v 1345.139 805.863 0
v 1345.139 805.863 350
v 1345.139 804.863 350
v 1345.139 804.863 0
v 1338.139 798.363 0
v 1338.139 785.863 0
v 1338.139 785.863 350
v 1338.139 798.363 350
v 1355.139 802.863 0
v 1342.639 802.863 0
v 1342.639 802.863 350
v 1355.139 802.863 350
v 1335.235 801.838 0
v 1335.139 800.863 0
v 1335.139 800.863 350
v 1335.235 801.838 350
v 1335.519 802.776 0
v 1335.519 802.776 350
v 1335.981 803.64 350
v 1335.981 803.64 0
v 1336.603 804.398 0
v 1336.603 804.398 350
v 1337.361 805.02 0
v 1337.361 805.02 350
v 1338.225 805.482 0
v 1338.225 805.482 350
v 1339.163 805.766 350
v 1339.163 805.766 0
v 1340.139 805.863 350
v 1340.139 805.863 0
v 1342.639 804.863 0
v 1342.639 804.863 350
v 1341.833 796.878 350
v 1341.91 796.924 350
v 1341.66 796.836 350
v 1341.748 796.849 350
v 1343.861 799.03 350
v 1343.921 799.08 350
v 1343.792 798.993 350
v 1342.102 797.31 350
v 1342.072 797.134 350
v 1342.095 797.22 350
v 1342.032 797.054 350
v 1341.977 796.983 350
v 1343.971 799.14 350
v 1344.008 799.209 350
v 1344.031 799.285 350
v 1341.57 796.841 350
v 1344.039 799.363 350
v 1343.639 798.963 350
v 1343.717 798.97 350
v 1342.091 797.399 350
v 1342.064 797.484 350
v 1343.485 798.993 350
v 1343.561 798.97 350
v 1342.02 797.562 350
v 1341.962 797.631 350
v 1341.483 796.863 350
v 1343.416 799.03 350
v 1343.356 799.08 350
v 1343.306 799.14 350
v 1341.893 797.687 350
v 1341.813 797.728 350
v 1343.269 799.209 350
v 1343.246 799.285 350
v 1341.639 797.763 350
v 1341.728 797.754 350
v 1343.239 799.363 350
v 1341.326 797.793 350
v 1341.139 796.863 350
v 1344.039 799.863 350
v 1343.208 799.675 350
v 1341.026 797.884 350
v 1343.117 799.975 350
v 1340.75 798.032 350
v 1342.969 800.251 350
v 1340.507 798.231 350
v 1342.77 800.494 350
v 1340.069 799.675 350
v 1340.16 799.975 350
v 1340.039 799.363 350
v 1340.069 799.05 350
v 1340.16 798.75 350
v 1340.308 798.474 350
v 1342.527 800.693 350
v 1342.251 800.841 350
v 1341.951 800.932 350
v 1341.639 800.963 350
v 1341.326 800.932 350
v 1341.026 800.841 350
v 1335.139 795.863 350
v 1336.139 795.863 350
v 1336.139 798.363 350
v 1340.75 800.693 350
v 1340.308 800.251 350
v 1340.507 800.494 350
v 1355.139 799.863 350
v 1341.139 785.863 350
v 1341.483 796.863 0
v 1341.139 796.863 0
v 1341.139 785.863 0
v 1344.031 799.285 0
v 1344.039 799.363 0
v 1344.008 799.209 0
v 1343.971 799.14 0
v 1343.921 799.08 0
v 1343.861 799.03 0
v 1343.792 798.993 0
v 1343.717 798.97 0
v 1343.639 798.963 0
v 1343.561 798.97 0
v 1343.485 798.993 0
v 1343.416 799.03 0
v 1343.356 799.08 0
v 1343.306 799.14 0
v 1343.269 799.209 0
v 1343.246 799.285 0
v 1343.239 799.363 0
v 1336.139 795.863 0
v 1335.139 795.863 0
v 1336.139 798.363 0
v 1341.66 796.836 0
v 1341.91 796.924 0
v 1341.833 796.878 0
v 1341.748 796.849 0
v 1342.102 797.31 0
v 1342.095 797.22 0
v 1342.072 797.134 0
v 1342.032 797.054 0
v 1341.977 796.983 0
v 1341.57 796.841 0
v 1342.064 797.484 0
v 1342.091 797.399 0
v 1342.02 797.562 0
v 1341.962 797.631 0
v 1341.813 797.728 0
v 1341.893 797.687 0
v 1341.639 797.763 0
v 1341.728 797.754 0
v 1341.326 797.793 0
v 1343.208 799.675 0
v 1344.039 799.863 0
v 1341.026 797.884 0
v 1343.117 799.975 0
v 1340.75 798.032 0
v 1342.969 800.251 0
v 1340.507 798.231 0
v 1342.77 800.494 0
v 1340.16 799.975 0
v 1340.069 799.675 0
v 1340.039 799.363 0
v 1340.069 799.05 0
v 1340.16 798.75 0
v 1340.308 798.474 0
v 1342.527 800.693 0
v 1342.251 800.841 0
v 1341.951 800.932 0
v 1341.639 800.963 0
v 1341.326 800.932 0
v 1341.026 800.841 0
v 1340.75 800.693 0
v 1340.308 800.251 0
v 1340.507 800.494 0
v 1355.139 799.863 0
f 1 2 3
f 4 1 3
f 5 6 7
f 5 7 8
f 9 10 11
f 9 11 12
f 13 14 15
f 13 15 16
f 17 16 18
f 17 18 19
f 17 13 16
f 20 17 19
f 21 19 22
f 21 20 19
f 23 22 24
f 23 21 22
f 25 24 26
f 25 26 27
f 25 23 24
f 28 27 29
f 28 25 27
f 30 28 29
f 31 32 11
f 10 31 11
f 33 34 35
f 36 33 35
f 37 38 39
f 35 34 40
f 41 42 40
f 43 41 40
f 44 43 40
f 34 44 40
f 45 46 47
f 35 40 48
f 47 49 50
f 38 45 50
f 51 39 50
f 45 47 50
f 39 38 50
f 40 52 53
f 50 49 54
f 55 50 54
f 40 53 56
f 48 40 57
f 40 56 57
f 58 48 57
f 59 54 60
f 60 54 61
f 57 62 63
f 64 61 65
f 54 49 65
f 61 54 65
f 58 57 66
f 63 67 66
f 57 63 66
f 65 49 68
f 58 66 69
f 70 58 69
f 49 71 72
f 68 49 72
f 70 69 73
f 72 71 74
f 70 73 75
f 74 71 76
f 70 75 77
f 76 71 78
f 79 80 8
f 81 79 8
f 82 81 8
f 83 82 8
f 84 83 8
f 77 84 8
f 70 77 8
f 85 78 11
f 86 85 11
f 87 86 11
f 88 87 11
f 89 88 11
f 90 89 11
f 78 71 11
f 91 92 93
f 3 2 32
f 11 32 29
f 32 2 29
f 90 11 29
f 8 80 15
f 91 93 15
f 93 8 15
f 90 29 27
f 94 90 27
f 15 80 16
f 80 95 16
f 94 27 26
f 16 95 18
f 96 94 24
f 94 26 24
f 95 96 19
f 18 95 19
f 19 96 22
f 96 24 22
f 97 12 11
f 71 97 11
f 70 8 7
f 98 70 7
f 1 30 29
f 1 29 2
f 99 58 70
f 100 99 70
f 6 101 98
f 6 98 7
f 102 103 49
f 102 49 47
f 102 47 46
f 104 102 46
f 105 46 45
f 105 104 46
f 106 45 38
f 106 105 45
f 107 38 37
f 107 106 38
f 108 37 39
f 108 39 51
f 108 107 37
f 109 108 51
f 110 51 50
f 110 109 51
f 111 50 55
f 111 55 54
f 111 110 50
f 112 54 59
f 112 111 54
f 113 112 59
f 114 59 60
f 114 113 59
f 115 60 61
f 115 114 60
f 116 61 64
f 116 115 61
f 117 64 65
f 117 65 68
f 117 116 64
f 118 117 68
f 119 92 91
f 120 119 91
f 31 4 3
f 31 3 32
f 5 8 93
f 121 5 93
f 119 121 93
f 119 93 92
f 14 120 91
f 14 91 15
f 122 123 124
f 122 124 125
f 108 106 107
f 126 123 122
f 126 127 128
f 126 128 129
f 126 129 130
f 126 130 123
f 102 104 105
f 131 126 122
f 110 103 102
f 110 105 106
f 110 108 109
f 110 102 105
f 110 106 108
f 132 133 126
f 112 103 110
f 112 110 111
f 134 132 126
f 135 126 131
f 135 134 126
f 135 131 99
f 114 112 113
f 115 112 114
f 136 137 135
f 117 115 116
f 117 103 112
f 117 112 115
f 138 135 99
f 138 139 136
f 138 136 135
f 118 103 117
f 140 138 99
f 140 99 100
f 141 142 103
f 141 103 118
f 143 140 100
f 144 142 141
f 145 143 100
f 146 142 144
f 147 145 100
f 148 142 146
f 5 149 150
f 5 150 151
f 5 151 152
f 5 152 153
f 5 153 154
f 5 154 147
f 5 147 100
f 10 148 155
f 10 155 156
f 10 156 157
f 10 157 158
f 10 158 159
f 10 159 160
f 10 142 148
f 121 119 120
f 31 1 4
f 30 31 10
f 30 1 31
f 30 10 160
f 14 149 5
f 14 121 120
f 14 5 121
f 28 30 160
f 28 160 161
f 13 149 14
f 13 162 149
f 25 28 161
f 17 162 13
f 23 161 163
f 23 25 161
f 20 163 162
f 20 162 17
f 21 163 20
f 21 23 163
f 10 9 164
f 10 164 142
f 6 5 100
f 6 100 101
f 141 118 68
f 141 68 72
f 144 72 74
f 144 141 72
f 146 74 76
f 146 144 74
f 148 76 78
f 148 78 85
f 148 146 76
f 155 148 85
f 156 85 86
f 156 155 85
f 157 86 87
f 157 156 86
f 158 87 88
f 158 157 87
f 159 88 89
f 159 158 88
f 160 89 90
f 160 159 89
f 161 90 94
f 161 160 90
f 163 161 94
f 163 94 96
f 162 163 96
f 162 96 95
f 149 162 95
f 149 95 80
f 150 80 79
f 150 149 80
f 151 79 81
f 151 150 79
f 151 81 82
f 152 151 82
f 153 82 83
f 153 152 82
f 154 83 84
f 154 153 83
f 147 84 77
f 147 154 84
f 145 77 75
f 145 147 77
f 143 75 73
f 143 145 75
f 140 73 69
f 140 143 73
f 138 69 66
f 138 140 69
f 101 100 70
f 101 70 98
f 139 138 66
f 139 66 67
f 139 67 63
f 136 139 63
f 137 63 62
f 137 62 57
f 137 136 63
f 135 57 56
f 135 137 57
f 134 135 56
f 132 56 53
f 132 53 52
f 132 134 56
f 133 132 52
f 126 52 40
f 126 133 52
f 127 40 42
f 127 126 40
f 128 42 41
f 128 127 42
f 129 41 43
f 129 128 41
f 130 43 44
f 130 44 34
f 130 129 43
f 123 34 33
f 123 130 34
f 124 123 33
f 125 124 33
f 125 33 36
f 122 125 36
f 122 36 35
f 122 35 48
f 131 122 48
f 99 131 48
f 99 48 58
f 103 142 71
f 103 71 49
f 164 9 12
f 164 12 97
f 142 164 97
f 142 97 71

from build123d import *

# Parameters (mm, degrees)
EXTRUDE_1_DEPTH = 350


with BuildPart() as part:
    # Model → 凸台-拉伸1 (new body)
    with BuildSketch(Plane.XY):
        with BuildLine():
            Line((1340.138554246, 805.862554257), (1345.138554246, 805.862554257))
            Line((1345.138554246, 805.862554257), (1345.138554246, 804.862554257))
            Line((1345.138554246, 804.862554257), (1342.638554246, 804.862554257))
            Line((1342.638554246, 804.862554257), (1342.638554246, 802.862554257))
            Line((1342.638554246, 802.862554257), (1355.138554246, 802.862554257))
            Line((1355.138554246, 802.862554257), (1355.138554246, 799.862554257))
            Line((1355.138554246, 799.862554257), (1344.038554246, 799.862554257))
            Line((1344.038554246, 799.862554257), (1344.038554246, 799.362554257))
            ThreePointArc((1344.038554246, 799.362554257), (1343.638554246, 798.962554257), (1343.238554246, 799.362554257))
            ThreePointArc((1343.238554246, 799.362554257), (1340.507183396, 800.493925107), (1341.638554246, 797.762554257))
            ThreePointArc((1341.638554246, 797.762554257), (1342.09519806, 797.220410998), (1341.483330886, 796.862554257))
            Line((1341.483330886, 796.862554257), (1341.138554246, 796.862554257))
            Line((1341.138554246, 796.862554257), (1341.138554246, 785.862554257))
            Line((1341.138554246, 785.862554257), (1338.138554246, 785.862554257))
            Line((1338.138554246, 785.862554257), (1338.138554246, 798.362554257))
            Line((1338.138554246, 798.362554257), (1336.138554246, 798.362554257))
            Line((1336.138554246, 798.362554257), (1336.138554246, 795.862554257))
            Line((1336.138554246, 795.862554257), (1335.138554246, 795.862554257))
            Line((1335.138554246, 795.862554257), (1335.138554246, 800.862554257))
            ThreePointArc((1335.138554246, 800.862554257), (1336.60302034, 804.398088163), (1340.138554246, 805.862554257))
        make_face()
    extrude(amount=EXTRUDE_1_DEPTH)


solid = part.part
